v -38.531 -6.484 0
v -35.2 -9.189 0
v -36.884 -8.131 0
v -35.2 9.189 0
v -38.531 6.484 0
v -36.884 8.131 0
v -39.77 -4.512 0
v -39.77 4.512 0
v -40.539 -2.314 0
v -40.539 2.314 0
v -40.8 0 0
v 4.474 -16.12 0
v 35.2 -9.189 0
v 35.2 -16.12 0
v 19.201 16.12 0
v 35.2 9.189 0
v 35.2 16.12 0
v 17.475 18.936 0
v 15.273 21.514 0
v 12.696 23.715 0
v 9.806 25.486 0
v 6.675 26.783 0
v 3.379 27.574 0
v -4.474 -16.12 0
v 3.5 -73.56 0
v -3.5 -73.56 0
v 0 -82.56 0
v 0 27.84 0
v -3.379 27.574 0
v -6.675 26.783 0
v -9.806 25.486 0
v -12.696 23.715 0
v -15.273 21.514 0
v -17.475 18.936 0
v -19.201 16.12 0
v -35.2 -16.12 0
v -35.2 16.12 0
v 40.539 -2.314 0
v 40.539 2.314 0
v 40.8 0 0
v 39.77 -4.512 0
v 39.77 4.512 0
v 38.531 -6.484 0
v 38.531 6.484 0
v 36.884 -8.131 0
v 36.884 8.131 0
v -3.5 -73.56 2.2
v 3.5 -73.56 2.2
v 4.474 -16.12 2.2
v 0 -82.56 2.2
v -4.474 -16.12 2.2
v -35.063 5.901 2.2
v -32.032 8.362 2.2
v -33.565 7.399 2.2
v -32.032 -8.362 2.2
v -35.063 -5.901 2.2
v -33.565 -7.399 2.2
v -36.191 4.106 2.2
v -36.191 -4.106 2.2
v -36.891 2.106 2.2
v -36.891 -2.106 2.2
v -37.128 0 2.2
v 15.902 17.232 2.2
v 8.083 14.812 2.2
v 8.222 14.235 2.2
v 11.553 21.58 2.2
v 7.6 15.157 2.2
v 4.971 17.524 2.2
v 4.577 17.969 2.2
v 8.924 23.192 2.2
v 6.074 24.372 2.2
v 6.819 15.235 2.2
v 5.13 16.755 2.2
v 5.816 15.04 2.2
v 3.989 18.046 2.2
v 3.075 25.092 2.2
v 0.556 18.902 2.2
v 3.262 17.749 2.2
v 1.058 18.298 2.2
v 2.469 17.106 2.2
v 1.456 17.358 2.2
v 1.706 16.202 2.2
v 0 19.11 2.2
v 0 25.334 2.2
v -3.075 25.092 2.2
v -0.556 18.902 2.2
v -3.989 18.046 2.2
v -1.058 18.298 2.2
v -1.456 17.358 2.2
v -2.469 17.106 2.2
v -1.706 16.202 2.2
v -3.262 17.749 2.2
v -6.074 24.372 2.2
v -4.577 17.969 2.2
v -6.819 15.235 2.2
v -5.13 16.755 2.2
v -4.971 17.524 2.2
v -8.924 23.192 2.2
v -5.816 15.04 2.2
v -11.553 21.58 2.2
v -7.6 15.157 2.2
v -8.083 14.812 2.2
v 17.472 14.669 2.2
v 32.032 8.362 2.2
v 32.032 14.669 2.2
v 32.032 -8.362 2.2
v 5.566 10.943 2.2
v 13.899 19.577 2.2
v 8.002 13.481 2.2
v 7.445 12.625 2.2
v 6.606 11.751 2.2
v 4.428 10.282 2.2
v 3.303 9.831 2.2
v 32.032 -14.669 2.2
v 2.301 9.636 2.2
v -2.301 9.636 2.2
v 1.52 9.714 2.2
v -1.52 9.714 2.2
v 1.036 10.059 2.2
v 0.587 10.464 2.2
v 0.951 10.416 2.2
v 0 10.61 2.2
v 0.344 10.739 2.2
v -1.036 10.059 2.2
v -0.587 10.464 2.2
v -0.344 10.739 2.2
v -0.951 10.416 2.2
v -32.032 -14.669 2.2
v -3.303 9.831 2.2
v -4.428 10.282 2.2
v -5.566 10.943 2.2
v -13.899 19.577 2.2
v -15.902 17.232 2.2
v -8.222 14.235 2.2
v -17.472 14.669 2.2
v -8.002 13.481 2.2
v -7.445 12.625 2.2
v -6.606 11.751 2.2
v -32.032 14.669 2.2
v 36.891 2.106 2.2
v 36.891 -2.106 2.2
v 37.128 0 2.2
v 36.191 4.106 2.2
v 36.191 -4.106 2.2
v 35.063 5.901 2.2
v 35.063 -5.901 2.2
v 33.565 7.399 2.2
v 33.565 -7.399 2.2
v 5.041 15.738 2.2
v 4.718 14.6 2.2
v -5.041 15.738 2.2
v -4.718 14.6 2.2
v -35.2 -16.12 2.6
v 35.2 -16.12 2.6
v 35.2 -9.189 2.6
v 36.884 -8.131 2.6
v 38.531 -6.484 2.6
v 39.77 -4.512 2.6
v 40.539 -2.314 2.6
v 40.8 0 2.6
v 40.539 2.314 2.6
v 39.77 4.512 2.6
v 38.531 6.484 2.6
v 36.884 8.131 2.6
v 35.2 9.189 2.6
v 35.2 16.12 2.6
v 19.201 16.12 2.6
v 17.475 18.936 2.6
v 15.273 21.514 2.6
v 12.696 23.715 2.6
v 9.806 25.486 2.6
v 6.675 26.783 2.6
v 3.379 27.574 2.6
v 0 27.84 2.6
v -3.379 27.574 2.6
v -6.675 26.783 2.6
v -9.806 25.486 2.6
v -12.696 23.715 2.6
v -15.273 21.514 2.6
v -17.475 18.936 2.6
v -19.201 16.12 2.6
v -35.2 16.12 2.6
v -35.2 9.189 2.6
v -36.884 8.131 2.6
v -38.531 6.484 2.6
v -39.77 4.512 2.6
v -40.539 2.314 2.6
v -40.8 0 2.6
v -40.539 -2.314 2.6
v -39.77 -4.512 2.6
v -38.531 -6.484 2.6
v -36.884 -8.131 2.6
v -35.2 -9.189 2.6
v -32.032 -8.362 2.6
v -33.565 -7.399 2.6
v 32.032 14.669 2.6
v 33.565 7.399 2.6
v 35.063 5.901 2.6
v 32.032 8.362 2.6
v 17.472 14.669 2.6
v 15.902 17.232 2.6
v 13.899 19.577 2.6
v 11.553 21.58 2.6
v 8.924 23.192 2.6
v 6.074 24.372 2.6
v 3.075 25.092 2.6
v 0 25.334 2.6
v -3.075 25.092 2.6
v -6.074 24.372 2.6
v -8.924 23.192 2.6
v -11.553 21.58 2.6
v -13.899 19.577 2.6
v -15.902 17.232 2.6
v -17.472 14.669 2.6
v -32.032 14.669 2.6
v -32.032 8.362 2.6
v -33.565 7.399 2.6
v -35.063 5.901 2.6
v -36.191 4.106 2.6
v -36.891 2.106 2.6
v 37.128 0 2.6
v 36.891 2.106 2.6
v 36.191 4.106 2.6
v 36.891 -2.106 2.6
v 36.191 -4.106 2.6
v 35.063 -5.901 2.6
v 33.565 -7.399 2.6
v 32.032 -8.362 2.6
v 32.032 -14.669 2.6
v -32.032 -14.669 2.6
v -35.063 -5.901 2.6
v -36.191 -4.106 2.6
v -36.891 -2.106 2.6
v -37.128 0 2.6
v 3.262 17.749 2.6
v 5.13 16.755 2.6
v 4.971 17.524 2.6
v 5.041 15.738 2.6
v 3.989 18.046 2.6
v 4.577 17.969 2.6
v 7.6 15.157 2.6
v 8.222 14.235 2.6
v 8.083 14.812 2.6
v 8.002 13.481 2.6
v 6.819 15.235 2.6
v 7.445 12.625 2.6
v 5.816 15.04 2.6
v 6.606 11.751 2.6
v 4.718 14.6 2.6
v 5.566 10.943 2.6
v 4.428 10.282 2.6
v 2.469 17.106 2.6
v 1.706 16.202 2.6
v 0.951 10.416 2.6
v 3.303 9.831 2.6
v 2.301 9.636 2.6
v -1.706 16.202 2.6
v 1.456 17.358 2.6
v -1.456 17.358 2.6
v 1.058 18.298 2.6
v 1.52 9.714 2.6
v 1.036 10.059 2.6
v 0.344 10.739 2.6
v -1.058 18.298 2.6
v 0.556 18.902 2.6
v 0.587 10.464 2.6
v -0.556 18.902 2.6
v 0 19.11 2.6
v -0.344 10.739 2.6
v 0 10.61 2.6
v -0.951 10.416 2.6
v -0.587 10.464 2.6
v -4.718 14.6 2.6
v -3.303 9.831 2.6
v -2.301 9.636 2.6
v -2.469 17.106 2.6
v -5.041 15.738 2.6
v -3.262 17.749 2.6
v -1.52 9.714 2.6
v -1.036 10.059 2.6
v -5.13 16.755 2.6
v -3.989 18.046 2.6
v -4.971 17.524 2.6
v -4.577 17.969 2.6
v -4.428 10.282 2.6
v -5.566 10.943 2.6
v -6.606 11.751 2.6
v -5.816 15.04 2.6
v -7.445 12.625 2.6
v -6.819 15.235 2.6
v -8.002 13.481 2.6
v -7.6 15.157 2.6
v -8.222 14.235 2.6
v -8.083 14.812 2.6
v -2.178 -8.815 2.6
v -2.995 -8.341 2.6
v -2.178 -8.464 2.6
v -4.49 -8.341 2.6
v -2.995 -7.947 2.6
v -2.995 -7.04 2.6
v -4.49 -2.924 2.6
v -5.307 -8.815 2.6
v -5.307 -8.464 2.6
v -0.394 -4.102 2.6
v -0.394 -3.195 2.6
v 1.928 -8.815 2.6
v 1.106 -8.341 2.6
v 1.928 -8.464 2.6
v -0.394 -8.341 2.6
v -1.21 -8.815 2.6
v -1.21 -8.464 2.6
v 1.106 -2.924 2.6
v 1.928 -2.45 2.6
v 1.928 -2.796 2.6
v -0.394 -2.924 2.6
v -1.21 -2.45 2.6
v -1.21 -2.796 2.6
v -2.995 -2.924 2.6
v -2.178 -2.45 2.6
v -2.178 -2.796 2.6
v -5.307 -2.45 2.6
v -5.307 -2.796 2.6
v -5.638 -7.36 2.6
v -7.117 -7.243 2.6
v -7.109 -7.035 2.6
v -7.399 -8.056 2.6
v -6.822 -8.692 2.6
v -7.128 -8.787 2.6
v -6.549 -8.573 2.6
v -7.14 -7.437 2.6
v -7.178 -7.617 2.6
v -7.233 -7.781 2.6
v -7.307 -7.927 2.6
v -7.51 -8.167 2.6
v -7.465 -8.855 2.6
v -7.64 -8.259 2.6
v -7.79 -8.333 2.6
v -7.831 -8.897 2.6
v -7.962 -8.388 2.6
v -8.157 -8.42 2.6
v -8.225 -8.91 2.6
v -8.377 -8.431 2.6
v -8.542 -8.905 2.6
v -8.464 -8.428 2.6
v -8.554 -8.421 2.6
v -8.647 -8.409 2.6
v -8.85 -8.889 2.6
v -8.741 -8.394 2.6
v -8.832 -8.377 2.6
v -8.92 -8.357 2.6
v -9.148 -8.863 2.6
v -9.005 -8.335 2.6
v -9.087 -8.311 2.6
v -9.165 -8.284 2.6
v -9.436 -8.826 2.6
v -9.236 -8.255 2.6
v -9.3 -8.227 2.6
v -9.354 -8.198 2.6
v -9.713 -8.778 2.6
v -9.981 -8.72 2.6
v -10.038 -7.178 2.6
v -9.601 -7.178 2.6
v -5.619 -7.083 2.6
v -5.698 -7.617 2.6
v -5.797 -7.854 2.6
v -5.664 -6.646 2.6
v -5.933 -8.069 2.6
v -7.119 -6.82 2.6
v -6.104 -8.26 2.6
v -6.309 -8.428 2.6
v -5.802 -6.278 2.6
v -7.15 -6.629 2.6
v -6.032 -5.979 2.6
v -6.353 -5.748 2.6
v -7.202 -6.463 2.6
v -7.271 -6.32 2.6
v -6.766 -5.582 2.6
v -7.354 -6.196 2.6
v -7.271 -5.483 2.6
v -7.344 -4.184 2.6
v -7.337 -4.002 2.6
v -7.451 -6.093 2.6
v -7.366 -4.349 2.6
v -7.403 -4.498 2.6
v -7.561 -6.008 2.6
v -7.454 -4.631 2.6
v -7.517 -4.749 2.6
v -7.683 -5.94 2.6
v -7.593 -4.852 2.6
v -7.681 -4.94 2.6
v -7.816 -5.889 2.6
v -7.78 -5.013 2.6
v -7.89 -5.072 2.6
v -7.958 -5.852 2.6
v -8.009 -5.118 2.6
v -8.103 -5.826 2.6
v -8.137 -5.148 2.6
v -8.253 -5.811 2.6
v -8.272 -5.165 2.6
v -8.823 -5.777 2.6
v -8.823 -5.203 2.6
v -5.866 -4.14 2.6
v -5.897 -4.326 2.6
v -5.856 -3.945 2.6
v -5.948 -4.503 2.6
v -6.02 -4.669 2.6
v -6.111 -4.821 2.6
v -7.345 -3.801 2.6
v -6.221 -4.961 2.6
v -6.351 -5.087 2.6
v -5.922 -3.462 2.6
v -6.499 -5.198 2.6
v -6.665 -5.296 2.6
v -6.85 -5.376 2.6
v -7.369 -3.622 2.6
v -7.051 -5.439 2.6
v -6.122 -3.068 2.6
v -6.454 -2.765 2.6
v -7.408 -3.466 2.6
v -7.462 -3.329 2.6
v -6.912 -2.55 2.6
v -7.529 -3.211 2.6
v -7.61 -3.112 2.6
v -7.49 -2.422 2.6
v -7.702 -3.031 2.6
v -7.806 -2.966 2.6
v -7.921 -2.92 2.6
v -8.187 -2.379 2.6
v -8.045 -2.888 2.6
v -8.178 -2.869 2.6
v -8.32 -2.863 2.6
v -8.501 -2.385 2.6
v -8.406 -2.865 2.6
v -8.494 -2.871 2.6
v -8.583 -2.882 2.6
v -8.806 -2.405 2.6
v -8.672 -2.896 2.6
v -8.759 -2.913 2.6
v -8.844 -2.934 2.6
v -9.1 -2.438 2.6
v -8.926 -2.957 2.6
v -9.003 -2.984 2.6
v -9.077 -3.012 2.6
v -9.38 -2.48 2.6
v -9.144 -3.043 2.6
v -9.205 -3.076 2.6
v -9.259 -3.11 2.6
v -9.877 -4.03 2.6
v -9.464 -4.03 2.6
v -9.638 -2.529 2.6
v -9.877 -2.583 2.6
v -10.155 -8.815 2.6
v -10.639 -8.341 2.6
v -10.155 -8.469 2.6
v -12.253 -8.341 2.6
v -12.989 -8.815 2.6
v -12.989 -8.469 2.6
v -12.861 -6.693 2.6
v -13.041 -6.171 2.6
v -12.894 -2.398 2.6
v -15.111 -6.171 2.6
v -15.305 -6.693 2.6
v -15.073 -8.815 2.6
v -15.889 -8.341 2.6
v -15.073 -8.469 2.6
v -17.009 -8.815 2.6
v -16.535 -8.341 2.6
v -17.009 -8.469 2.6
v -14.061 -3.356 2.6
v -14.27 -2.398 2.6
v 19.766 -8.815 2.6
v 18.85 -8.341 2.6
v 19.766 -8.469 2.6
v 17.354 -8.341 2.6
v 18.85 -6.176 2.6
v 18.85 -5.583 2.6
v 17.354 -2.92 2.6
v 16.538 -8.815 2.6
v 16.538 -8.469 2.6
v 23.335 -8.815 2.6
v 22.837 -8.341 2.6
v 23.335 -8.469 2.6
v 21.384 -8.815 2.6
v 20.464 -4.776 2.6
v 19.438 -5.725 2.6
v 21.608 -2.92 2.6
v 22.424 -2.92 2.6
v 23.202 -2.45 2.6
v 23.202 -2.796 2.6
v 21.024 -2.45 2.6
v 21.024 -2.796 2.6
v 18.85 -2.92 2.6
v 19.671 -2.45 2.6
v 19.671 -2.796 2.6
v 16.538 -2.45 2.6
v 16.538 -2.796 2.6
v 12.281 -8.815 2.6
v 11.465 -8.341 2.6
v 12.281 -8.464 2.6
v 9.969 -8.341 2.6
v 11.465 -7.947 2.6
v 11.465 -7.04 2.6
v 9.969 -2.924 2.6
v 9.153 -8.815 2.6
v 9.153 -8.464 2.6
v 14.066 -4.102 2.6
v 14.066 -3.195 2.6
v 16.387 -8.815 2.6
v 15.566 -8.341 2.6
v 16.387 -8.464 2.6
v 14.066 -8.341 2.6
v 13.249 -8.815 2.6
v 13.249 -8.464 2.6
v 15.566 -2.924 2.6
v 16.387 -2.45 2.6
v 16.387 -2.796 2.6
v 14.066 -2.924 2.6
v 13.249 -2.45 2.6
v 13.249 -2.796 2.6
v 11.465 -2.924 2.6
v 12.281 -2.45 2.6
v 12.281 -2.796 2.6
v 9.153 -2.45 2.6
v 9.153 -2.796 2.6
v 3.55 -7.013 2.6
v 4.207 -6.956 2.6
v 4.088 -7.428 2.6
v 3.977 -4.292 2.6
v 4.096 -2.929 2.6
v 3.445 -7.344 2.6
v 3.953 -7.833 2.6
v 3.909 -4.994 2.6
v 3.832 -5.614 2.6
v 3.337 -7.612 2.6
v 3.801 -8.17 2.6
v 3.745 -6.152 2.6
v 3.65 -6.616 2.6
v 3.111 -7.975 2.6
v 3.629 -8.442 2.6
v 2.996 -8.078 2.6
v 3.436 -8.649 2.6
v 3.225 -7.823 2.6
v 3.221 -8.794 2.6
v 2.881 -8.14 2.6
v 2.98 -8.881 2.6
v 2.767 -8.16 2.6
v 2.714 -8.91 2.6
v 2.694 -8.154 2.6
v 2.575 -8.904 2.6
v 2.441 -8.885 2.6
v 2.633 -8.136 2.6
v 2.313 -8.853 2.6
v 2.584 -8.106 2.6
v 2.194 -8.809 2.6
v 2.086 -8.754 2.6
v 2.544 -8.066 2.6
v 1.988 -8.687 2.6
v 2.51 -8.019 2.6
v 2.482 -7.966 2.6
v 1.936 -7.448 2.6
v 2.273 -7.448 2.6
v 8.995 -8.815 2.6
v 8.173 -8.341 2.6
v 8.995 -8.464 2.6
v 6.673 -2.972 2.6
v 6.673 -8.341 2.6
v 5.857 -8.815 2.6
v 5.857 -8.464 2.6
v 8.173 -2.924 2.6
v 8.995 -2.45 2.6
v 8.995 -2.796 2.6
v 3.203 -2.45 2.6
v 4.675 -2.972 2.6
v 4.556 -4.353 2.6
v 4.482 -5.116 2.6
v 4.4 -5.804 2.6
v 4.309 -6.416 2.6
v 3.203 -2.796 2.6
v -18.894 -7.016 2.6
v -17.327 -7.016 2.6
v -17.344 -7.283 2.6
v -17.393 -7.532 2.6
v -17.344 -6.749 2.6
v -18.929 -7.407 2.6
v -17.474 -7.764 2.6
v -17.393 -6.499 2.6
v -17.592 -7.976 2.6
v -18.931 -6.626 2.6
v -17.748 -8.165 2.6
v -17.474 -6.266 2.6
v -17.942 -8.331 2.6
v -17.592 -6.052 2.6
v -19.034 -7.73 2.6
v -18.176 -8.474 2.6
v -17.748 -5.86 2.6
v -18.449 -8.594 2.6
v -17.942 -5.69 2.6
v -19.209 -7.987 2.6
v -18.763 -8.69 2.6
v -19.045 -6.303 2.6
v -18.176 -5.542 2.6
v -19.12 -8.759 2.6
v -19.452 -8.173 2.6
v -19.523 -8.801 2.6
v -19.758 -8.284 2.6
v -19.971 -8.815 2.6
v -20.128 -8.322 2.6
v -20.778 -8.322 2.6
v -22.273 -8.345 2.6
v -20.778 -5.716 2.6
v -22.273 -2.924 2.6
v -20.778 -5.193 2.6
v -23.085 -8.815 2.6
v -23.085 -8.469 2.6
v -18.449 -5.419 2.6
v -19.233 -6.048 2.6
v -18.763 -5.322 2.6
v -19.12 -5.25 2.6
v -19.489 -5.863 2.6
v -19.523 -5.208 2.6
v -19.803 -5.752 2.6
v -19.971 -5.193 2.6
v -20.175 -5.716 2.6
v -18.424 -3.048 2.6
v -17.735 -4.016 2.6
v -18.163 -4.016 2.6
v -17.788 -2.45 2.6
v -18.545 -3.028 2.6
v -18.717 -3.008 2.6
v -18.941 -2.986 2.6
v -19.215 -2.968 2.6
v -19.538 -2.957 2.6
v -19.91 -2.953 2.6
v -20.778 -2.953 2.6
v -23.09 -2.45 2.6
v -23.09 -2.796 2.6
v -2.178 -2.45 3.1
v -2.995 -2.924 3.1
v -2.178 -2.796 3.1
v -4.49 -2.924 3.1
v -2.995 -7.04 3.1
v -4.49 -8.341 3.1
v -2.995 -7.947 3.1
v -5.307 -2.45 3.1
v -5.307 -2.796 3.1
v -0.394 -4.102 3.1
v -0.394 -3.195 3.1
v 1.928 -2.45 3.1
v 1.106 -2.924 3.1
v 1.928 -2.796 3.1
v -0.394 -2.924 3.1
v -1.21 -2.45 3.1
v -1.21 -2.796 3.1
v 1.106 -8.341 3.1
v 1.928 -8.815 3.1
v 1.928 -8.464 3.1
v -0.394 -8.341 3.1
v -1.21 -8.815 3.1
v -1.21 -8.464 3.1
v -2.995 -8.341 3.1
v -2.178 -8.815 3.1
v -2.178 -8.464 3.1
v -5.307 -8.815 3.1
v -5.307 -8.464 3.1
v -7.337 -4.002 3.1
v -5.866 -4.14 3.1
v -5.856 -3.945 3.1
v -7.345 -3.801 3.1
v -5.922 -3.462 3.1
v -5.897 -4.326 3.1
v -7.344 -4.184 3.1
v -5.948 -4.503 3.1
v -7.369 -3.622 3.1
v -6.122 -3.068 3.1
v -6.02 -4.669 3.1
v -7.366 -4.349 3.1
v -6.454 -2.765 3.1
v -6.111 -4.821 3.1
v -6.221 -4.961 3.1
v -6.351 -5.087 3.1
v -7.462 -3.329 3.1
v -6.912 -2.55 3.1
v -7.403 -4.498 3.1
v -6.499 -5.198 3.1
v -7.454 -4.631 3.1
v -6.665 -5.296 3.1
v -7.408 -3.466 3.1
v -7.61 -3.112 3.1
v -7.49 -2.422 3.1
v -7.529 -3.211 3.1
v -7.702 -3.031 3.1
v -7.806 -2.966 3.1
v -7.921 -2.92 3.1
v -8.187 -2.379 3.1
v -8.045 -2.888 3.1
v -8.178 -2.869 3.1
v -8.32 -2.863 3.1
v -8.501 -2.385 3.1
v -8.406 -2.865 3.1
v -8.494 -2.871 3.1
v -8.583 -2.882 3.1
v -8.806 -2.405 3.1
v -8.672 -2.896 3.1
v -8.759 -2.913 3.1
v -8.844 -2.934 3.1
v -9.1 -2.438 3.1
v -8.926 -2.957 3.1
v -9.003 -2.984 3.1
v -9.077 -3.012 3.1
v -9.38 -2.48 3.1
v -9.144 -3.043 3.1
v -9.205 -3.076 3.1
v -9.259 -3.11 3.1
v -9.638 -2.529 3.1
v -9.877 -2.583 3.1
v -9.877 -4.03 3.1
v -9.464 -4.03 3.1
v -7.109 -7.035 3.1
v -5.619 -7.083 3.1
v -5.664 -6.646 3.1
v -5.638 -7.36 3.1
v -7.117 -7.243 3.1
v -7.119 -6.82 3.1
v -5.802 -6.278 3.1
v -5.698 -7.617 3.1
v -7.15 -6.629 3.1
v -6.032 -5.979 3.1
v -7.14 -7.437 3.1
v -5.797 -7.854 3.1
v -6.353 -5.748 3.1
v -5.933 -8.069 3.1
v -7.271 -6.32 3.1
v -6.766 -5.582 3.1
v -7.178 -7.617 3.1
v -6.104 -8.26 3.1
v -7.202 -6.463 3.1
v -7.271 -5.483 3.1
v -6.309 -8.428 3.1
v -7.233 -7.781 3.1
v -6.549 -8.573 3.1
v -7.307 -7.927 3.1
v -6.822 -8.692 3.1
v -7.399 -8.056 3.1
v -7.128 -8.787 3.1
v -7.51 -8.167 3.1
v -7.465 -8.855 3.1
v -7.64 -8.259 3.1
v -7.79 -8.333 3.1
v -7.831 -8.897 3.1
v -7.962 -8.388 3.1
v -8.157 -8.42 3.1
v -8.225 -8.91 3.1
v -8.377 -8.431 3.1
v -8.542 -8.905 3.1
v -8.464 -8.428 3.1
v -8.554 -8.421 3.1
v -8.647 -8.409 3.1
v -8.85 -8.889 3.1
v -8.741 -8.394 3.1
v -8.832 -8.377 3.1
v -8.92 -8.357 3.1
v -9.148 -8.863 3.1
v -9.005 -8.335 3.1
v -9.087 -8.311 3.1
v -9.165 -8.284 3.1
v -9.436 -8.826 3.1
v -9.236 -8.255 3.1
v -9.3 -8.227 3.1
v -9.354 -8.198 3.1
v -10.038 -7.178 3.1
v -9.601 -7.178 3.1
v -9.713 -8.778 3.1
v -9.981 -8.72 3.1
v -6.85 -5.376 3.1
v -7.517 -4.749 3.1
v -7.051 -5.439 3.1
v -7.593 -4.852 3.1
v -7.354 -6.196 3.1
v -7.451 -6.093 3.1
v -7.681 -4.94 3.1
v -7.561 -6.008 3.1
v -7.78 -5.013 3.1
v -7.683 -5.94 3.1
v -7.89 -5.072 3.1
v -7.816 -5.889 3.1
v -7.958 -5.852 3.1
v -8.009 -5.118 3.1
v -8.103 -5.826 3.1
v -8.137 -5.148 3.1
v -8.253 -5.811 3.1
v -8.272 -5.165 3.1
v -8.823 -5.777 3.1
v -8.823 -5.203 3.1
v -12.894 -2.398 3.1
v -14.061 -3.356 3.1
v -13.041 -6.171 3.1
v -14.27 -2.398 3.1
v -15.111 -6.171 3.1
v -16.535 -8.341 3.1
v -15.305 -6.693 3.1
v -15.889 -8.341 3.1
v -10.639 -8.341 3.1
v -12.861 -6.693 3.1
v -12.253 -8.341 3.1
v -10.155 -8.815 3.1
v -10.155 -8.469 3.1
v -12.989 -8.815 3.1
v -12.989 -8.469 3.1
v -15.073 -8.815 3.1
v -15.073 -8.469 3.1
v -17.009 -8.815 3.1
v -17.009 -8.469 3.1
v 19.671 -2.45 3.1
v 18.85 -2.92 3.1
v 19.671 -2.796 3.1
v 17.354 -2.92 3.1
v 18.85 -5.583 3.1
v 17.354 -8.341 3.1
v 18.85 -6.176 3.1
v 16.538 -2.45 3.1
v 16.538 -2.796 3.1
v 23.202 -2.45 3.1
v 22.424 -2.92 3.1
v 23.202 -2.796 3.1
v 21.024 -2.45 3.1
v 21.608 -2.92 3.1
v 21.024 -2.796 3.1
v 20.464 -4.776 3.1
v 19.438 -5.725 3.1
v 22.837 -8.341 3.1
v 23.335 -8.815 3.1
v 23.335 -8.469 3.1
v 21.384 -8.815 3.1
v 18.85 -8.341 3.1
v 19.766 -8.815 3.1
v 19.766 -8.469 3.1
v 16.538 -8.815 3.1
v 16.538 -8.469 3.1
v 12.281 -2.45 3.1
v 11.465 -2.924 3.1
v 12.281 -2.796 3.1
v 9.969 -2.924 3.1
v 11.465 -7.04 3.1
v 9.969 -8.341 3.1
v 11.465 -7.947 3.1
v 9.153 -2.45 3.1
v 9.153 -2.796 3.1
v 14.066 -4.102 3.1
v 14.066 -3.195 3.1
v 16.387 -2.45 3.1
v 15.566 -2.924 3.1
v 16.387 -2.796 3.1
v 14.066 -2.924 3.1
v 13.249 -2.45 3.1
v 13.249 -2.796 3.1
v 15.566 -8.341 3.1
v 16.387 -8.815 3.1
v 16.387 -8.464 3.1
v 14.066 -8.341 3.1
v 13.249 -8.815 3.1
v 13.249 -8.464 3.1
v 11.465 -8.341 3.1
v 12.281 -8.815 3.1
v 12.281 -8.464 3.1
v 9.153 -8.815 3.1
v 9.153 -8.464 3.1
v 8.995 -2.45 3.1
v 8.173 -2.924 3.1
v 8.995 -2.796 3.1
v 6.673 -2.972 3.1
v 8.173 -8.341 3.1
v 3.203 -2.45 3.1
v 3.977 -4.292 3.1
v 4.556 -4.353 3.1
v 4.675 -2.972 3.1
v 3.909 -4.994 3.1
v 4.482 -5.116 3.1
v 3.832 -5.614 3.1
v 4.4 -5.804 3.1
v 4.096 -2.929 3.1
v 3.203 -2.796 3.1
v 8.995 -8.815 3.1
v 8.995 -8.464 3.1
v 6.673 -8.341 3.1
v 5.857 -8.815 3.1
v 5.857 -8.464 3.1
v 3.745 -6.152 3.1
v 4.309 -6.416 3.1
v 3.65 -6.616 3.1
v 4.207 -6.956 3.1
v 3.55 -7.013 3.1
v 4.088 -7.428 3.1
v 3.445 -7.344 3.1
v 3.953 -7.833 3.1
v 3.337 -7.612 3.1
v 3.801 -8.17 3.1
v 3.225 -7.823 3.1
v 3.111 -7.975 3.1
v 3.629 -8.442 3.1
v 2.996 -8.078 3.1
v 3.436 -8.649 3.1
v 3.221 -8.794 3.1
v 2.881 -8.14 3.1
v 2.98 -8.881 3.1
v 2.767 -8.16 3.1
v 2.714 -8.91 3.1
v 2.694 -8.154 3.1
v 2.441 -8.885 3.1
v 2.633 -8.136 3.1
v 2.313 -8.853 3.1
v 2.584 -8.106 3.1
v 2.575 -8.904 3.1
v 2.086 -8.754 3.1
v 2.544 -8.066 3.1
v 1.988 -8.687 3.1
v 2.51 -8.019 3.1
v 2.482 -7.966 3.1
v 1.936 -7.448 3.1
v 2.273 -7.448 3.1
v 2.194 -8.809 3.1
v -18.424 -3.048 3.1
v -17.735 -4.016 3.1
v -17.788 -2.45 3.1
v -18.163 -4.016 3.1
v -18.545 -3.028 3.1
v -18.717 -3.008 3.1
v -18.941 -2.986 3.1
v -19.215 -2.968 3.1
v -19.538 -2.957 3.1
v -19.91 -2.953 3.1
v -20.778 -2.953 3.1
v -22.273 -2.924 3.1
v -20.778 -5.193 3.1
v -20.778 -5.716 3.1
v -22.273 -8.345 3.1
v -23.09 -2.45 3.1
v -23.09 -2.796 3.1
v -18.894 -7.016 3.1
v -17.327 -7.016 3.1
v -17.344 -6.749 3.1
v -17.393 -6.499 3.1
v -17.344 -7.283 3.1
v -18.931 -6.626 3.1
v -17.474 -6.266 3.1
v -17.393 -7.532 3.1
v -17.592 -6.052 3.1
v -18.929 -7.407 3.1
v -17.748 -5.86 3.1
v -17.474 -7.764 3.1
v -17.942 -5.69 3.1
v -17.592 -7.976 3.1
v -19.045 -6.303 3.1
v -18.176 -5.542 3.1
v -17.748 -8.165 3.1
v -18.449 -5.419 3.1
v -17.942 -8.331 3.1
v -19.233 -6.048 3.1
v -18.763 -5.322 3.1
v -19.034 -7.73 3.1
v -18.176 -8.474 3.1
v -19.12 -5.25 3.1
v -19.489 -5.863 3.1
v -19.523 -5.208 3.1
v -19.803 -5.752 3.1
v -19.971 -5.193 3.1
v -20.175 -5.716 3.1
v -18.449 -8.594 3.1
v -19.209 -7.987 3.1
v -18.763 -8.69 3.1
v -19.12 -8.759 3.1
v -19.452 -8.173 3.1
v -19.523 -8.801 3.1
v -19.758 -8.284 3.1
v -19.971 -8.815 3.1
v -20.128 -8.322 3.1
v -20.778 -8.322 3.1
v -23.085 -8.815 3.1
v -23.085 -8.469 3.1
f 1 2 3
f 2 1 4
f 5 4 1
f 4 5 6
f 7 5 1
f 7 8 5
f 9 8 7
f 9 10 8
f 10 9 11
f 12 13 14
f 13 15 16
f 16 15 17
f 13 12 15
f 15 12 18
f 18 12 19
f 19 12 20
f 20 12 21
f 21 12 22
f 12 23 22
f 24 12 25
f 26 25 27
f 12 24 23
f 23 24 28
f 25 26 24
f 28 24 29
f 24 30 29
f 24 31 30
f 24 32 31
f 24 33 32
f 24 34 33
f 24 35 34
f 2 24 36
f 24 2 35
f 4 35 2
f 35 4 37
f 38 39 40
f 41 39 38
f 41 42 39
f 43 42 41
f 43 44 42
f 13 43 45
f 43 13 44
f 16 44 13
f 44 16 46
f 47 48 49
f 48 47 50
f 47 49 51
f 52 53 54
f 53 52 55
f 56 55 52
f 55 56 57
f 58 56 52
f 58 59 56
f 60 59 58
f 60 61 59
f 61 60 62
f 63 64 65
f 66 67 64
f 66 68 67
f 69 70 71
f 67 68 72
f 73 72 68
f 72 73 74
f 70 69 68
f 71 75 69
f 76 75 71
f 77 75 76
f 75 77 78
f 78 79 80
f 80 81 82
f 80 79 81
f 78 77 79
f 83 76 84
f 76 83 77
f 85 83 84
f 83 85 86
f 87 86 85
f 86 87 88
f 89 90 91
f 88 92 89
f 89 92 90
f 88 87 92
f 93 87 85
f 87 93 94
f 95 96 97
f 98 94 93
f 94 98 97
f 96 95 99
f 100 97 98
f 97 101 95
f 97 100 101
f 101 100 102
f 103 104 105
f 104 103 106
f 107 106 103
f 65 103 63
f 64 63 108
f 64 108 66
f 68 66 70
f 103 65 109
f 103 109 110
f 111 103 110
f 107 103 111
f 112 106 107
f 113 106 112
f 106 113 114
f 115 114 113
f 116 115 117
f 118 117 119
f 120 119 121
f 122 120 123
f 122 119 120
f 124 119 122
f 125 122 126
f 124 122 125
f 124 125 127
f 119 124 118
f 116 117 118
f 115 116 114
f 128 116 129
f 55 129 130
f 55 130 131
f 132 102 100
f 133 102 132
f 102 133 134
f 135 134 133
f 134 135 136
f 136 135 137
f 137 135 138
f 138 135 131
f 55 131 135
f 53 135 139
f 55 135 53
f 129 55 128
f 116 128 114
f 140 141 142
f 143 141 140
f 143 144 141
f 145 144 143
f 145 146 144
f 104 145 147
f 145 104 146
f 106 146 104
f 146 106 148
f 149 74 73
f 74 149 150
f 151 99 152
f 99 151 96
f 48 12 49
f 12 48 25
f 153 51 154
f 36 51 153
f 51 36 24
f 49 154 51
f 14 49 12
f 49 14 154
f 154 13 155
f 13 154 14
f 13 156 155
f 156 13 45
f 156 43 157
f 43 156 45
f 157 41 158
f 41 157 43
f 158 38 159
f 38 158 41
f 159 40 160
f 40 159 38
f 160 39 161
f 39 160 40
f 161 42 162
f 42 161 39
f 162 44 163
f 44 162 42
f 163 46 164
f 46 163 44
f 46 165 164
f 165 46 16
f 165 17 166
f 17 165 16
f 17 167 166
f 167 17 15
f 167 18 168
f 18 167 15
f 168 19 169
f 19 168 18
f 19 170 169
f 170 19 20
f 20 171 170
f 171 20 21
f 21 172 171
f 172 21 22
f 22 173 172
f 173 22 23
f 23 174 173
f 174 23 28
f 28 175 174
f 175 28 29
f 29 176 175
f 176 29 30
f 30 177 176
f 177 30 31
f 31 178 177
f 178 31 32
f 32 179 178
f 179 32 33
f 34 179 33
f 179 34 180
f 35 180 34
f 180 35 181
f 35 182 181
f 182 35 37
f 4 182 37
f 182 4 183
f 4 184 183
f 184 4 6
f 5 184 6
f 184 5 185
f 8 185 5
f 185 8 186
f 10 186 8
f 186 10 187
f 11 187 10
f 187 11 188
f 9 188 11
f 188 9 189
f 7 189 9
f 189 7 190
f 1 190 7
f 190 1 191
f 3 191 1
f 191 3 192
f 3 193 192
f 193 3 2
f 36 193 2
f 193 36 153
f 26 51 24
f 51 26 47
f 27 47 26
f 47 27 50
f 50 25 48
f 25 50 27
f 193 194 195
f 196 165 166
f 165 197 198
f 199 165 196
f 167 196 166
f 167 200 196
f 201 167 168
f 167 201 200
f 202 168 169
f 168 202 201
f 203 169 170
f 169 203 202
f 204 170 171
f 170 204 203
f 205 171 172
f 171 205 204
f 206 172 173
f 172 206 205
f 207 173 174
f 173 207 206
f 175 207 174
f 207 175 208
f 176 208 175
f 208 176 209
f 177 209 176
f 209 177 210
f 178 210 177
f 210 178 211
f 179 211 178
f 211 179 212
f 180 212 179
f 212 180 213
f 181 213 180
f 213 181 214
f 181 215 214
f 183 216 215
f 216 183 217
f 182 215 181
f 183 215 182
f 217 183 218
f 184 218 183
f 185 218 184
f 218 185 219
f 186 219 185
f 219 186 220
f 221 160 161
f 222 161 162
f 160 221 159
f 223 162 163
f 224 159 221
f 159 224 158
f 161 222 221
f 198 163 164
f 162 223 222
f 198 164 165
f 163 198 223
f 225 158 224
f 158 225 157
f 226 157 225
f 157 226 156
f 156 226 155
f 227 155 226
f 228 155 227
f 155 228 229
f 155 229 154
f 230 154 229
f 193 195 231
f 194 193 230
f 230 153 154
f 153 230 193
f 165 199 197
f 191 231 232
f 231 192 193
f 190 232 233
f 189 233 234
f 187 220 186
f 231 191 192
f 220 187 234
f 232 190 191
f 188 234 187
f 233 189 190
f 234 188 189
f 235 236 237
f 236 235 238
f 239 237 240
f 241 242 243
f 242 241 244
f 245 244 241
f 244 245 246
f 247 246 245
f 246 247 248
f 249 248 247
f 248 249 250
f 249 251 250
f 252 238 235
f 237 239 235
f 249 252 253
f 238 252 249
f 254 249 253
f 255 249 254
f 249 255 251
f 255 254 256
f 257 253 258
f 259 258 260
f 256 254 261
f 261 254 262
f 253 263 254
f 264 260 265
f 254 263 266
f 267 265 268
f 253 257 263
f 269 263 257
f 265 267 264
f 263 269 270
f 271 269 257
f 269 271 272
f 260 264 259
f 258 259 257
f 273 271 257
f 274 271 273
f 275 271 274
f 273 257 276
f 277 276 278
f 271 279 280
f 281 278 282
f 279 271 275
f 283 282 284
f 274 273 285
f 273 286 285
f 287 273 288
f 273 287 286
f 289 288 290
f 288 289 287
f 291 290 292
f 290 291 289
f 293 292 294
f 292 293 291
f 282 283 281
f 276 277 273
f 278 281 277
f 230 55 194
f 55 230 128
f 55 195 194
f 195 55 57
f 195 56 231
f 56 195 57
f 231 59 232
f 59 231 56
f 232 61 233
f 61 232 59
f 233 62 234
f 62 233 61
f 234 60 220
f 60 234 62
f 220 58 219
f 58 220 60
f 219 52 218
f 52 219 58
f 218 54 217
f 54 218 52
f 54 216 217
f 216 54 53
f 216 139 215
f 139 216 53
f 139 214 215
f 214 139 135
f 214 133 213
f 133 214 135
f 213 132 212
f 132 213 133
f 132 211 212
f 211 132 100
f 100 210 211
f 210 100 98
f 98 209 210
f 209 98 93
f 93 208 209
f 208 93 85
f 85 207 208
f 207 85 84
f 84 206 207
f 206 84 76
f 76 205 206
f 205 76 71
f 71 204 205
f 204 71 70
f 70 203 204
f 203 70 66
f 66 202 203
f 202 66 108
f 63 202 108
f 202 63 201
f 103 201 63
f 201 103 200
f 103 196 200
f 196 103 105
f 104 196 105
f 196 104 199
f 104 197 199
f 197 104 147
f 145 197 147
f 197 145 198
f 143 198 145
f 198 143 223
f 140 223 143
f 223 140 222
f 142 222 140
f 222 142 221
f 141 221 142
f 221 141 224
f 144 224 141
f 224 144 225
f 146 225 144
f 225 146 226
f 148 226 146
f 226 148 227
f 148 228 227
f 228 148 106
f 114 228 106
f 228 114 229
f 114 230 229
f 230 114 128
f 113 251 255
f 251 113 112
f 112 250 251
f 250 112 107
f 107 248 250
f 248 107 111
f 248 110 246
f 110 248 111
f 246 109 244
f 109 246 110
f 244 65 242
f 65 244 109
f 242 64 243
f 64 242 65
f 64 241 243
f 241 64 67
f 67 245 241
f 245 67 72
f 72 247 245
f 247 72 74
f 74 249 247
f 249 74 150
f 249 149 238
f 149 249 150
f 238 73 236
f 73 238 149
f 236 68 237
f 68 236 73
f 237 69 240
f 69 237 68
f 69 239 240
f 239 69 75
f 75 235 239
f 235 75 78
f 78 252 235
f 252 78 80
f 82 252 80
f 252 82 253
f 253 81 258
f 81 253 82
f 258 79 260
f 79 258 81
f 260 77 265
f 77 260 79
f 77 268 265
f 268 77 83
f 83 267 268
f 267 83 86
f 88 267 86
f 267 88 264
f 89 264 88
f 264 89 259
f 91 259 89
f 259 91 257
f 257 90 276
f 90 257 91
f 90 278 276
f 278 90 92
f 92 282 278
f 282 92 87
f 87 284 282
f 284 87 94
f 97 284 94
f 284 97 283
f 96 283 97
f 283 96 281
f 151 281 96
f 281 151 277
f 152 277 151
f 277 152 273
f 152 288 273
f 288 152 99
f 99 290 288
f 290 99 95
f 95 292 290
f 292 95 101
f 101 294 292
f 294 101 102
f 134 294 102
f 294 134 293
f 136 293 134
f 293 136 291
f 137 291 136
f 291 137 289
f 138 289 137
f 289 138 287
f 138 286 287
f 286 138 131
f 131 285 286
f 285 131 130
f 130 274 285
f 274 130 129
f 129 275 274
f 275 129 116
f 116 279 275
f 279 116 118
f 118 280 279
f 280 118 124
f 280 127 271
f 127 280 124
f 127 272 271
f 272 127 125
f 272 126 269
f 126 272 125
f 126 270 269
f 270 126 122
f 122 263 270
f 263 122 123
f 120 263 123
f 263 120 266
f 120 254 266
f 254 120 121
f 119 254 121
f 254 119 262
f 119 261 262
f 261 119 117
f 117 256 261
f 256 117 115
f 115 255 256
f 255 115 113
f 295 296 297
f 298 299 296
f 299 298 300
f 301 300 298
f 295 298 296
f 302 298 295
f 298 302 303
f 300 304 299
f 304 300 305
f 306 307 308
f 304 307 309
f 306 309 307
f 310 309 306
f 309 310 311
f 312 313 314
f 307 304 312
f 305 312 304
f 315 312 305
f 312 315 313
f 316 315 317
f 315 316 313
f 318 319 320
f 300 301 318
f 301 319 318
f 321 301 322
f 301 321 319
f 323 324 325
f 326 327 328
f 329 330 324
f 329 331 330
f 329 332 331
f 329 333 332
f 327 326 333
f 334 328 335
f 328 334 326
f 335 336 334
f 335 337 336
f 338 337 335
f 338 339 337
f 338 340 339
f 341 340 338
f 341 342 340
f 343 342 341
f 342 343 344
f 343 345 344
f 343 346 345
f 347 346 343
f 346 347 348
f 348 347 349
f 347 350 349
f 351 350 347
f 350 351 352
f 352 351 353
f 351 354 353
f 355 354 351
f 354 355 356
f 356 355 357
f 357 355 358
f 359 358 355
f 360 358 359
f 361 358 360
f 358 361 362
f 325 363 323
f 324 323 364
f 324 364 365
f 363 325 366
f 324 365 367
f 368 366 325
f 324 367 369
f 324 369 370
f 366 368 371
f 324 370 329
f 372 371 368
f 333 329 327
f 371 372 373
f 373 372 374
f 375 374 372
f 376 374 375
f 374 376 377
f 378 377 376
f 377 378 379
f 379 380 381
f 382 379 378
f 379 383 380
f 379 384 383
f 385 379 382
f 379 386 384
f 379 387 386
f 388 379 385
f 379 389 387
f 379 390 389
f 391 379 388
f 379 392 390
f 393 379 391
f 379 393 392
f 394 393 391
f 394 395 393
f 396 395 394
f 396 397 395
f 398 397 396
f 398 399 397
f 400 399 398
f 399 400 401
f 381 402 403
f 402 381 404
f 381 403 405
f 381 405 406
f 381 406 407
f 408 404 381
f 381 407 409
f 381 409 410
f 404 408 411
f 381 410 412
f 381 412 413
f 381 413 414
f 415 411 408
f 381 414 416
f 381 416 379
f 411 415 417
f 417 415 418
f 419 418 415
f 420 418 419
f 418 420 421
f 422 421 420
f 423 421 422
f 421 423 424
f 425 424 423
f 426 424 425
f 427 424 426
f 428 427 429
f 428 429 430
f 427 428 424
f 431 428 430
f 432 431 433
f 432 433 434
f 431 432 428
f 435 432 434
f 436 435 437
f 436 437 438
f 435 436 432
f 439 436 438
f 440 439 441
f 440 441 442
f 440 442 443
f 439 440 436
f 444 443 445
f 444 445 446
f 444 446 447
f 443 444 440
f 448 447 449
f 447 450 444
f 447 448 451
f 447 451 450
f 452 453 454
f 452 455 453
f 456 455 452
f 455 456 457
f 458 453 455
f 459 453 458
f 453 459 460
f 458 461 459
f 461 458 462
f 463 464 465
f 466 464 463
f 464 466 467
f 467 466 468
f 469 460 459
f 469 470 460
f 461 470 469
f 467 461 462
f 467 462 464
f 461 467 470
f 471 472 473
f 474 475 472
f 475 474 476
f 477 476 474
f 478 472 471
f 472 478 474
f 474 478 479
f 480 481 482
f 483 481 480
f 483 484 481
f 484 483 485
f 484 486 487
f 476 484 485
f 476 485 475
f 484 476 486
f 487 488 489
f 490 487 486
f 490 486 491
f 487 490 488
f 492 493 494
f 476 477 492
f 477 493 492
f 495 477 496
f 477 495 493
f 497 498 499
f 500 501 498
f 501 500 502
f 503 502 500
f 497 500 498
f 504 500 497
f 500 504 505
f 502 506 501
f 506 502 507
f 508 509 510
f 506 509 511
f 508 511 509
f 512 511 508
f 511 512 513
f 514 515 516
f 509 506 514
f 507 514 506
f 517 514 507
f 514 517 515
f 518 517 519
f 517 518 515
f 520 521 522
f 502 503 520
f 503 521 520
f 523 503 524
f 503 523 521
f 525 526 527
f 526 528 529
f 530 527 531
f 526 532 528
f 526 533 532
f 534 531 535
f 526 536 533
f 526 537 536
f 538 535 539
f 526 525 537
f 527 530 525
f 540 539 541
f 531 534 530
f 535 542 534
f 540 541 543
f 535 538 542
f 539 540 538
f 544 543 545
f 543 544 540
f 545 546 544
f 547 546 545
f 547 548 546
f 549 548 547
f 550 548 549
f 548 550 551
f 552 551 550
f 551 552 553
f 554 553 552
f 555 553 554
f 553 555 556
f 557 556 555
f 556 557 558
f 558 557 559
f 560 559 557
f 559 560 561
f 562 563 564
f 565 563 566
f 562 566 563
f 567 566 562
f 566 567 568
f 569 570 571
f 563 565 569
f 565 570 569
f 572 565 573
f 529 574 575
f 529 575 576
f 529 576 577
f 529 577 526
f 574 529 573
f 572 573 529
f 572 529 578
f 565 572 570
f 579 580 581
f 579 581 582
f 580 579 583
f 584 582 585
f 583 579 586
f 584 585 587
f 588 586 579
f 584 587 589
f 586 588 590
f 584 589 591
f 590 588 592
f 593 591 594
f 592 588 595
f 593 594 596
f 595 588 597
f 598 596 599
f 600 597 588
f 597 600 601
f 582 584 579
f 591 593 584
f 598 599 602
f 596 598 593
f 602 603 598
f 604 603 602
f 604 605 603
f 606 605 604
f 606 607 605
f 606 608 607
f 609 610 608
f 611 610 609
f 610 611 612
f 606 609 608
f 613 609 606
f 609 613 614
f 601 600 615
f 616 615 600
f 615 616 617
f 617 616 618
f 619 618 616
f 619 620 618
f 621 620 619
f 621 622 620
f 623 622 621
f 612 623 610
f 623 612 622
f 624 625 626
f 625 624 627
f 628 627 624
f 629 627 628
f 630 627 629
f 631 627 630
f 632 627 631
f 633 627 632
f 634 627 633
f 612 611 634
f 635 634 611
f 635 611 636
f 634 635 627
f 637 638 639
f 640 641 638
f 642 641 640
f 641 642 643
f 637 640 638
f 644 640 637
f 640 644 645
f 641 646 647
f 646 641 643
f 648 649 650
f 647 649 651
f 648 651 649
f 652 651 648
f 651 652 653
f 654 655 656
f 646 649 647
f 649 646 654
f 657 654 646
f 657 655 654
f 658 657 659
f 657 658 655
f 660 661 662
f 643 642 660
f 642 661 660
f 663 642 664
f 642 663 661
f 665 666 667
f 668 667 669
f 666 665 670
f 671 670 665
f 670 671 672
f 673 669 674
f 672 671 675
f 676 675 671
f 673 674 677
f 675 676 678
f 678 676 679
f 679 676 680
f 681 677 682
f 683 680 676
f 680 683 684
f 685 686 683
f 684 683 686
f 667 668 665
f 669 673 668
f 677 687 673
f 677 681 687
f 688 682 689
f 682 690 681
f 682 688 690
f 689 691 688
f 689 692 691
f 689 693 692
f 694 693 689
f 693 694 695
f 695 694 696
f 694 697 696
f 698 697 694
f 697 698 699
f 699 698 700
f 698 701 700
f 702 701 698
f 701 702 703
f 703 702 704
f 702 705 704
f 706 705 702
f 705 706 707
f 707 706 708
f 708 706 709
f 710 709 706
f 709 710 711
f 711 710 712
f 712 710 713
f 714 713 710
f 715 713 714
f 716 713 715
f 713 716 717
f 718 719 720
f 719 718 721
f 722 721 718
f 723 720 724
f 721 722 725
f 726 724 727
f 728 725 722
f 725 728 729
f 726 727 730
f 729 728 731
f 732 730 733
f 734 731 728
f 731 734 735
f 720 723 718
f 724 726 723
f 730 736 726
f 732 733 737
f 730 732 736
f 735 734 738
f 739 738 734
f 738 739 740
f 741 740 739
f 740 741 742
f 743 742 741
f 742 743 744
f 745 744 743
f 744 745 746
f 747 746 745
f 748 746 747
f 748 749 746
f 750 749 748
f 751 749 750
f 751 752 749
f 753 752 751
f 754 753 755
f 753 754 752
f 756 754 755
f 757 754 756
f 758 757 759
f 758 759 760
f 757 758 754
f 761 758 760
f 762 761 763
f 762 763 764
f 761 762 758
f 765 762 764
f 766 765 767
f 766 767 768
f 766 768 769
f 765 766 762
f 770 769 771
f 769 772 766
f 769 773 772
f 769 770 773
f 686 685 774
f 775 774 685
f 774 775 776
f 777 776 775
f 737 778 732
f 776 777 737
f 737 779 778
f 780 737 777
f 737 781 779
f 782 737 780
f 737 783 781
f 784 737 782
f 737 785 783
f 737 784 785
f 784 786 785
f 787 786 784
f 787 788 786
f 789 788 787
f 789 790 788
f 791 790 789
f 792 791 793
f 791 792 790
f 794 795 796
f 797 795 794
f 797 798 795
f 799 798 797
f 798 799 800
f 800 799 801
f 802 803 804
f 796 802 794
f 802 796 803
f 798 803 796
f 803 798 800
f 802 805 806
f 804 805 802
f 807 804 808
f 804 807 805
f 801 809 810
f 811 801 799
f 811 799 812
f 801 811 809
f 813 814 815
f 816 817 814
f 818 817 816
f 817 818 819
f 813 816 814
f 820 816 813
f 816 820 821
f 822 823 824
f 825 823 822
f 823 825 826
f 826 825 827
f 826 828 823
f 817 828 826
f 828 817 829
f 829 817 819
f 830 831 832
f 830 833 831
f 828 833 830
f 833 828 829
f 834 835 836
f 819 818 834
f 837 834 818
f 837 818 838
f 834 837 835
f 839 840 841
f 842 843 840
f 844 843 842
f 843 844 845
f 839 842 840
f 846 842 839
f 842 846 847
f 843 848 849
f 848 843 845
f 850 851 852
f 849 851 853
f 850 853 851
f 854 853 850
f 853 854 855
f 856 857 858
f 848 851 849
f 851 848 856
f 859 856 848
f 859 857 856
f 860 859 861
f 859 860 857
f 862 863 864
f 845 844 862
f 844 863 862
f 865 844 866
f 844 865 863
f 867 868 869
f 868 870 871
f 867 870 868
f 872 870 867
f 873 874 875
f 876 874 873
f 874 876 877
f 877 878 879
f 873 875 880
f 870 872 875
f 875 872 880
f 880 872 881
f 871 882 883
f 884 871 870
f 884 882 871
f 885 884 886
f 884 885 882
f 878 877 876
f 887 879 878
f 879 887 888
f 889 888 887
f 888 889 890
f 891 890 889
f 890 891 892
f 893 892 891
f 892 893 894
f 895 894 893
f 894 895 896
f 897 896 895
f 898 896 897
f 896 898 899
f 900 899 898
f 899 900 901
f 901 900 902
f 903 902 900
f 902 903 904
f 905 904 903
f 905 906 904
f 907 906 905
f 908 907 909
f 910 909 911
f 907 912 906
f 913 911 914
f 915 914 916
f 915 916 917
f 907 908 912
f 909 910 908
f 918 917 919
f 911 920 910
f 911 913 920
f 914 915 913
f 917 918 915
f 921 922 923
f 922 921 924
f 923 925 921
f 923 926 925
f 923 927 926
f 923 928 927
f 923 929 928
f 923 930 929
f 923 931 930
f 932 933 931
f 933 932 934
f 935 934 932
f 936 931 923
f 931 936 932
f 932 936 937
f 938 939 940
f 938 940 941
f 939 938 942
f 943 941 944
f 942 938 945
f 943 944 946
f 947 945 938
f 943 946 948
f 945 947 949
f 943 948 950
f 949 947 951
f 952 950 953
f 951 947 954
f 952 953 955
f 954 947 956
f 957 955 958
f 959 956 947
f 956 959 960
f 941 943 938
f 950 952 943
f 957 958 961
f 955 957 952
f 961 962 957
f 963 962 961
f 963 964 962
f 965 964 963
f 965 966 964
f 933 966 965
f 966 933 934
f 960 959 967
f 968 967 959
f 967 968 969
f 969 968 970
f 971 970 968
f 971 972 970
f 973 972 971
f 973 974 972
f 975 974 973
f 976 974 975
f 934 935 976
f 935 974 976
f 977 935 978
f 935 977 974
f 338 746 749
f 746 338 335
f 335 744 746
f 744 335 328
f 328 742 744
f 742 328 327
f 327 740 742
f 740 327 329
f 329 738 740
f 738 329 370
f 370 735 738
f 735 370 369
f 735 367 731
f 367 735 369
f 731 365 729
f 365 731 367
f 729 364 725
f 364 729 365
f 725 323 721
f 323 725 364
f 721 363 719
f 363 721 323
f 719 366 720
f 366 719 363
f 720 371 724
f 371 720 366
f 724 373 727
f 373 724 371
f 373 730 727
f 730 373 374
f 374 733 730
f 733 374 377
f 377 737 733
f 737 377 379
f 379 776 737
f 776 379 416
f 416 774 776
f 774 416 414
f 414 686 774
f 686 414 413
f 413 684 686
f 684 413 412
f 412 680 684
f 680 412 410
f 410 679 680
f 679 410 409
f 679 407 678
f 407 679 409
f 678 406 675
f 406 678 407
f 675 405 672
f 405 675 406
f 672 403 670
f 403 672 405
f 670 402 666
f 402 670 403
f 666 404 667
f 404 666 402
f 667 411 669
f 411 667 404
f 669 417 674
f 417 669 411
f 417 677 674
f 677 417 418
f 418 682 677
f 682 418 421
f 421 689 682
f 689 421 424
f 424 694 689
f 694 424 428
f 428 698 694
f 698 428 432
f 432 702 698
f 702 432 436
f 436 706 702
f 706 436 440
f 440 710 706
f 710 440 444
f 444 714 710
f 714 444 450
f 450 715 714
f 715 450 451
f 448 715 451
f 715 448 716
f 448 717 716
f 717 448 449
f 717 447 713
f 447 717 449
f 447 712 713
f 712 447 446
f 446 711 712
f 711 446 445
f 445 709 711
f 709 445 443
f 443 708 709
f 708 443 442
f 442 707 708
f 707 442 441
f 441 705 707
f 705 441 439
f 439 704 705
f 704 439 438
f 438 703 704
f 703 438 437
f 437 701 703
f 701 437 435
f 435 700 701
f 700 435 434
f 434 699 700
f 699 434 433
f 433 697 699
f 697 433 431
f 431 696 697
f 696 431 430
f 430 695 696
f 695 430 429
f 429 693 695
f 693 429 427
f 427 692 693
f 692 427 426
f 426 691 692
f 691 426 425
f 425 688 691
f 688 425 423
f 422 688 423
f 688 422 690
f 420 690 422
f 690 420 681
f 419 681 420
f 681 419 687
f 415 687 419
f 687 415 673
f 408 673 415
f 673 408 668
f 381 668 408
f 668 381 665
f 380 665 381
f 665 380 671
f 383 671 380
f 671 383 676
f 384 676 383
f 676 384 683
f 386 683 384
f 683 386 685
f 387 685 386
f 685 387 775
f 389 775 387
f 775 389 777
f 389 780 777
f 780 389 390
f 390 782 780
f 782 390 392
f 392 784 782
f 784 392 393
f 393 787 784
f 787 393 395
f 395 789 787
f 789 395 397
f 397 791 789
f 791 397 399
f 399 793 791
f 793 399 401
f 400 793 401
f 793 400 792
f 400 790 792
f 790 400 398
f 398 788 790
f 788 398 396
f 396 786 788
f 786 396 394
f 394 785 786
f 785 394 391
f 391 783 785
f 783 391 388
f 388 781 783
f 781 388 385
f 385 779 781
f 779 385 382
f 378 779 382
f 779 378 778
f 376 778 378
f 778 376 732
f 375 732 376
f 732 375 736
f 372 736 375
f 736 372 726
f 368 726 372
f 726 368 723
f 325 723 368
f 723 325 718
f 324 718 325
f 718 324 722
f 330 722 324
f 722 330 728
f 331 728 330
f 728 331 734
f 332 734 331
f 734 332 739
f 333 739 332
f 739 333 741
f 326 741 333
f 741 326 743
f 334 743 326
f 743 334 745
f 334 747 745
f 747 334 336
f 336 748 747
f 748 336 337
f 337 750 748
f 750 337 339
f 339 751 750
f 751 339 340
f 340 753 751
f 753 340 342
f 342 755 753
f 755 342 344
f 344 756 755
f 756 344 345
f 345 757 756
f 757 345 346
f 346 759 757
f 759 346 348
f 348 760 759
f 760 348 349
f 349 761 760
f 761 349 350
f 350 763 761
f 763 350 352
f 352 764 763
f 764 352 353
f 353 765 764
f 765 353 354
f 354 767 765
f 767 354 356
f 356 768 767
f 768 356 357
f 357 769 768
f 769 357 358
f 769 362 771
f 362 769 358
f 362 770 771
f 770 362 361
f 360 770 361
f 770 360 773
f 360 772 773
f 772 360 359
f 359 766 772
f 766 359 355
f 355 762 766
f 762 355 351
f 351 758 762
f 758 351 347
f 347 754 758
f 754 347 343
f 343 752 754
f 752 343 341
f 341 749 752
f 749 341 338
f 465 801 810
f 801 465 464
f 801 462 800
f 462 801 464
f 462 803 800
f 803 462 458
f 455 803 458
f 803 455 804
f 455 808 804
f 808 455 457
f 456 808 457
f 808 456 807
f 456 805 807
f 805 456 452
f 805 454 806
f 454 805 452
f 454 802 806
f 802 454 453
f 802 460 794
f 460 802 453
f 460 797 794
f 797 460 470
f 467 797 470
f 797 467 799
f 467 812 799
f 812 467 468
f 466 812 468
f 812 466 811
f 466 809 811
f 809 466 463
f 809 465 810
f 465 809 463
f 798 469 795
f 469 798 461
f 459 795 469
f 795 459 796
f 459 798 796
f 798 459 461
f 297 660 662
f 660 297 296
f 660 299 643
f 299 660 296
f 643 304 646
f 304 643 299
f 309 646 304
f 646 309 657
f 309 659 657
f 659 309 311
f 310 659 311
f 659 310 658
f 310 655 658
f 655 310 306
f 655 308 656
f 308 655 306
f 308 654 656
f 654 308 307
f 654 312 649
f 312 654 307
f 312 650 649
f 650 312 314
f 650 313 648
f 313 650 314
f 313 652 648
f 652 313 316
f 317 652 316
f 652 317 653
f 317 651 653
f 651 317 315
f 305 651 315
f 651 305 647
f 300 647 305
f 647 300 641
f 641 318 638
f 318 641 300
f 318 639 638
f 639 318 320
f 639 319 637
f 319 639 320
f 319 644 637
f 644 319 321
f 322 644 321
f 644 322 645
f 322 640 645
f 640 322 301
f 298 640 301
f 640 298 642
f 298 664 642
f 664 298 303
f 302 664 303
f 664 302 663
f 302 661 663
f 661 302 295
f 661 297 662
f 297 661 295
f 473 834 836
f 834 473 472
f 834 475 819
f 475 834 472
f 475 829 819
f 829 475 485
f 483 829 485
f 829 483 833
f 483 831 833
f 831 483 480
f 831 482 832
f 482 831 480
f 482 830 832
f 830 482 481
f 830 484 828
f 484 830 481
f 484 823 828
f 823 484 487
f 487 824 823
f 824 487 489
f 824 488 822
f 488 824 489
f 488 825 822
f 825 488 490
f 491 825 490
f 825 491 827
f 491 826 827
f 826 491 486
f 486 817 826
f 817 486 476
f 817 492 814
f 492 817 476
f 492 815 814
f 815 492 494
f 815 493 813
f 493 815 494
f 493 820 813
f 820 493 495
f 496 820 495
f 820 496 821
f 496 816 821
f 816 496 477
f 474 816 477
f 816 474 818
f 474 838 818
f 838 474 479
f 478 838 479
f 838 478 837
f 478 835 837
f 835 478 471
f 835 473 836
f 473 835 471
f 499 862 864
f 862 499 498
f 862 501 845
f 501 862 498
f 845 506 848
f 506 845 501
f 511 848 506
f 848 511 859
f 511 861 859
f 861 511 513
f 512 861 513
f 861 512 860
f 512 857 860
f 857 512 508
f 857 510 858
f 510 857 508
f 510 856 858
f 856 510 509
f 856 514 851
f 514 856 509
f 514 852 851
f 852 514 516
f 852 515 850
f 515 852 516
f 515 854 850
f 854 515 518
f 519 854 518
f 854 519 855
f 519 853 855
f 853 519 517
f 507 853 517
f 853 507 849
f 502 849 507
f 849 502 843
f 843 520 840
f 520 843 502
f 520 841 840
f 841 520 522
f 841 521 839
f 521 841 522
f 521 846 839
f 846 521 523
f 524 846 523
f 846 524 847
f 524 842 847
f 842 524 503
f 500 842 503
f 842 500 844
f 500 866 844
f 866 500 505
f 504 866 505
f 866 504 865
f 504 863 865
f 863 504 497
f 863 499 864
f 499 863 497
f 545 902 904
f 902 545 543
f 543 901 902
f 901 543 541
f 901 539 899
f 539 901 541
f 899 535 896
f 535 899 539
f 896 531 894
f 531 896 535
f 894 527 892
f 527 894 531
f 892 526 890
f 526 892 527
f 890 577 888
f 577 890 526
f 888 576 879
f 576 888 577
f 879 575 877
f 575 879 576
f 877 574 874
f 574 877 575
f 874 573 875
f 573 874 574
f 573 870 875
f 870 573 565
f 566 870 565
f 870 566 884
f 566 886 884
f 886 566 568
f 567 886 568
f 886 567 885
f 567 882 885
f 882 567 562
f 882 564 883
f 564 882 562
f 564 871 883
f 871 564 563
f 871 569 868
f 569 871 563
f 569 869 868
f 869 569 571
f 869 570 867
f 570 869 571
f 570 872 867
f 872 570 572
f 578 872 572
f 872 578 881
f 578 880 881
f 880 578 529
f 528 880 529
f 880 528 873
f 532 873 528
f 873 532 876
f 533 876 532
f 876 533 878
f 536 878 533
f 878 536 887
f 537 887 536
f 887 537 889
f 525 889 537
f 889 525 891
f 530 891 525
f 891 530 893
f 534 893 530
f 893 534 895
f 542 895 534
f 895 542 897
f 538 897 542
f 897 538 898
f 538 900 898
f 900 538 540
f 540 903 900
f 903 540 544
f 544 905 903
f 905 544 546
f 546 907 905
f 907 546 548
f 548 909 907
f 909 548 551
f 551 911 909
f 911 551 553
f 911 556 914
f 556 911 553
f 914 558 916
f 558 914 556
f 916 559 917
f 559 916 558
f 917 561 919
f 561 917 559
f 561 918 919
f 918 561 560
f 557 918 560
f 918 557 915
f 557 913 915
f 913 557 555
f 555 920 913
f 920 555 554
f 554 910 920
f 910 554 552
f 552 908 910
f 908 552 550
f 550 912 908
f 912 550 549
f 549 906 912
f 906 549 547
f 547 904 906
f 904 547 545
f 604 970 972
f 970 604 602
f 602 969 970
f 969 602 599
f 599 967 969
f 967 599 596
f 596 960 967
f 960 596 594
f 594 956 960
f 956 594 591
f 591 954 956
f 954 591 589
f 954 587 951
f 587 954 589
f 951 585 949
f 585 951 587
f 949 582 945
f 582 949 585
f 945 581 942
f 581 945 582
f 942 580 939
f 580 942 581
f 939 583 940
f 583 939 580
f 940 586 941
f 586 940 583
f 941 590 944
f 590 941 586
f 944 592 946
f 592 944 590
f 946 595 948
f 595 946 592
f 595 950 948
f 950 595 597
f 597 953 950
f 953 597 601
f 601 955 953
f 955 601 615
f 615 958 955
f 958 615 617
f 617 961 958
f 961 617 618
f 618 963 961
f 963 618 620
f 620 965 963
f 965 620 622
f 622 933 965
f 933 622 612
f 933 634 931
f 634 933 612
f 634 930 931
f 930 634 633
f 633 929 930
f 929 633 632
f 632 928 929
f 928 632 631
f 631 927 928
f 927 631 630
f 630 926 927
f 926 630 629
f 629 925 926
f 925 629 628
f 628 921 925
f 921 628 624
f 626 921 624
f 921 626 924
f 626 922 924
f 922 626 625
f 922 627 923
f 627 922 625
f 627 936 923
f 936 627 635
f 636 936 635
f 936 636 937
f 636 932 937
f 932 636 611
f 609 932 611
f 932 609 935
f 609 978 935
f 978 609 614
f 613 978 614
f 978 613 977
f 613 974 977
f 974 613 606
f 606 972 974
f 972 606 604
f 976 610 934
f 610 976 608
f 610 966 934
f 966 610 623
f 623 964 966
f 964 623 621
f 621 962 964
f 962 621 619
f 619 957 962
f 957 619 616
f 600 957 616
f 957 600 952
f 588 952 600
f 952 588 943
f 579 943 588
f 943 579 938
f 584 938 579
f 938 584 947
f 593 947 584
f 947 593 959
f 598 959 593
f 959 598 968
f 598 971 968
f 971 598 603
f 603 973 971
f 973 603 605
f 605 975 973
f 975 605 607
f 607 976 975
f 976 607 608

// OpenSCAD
// Provence collection ("Прованс"):
// z = 0..2.2 mm: French-country plaque + stake (base filament)
// z = 2.2..2.6 mm: stepped border + embossed botanical sprig (accent filament)
// z = 2.6..3.1 mm: uppercase serif inscription (text filament)
tag_length = 80;
tag_height = 52;
tag_shape = "plaque";
tag_motif = "basil";
tag_text_1 = "БАЗИЛИК";
tag_text_2 = "";
font_size = 7.0;
letter_relief = 0.5;
font_name = "Liberation Serif:style=Bold";
stake_length = 68;

module plaque_2d(sc = 1) {
  scale([sc, sc])
    if (tag_shape == "watering_can" || tag_motif == "marjoram") {
      union() {
        polygon([
          [-22, -20], [22, -20], [18, 18], [-18, 18]
        ]);
        polygon([
          [-18, -4], [-38, 10], [-35, 15], [-16, 4]
        ]);
        difference() {
          translate([24, 0]) circle(r=11, $fn=28);
          translate([24, 0]) circle(r=6.5, $fn=28);
        }
      }
    } else if (tag_motif == "mint") {
      hull() {
        translate([-tag_length * 0.2, tag_height * 0.16]) circle(r=16, $fn=36);
        translate([tag_length * 0.2, tag_height * 0.16]) circle(r=16, $fn=36);
        translate([0, -tag_height * 0.42]) circle(r=4, $fn=20);
      }
    } else if (tag_motif == "rosemary") {
      resize([tag_length, tag_height * 0.78]) circle(d=tag_length, $fn=48);
    } else {
      union() {
        square([tag_length * 0.88, tag_height * 0.62], center=true);
        translate([0, tag_height * 0.12]) circle(r=tag_length * 0.27, $fn=40);
        translate([-tag_length * 0.38, 0]) circle(r=tag_height * 0.2, $fn=28);
        translate([tag_length * 0.38, 0]) circle(r=tag_height * 0.2, $fn=28);
      }
    }
}

module stake_2d() {
  polygon([
    [-4.5, -tag_height * 0.28],
    [4.5, -tag_height * 0.28],
    [3.5, -tag_height * 0.28 - stake_length + 9],
    [0, -tag_height * 0.28 - stake_length],
    [-3.5, -tag_height * 0.28 - stake_length + 9]
  ]);
}

module sprig_2d() {
  translate([0, tag_height * 0.18])
    for (a = [-56, -28, 0, 28, 56])
      rotate([0, 0, a])
        translate([0, 5.5])
          resize([3.6, 8.5]) circle(d=6, $fn=20);
}

linear_extrude(height=2.2) {
  plaque_2d(1);
  stake_2d();
}

translate([0, 0, 2.2])
  linear_extrude(height=0.4) {
    difference() {
      plaque_2d(1);
      plaque_2d(0.91);
    }
    sprig_2d();
  }

translate([0, 0, 2.6])
  linear_extrude(height=letter_relief) {
    translate([0, -tag_height * 0.11 + (tag_text_2 == "" ? 0 : font_size * 0.52)])
      text(tag_text_1, size=font_size, font=font_name, halign="center", valign="center");
    if (tag_text_2 != "")
      translate([0, -tag_height * 0.11 - font_size * 0.62])
        text(tag_text_2, size=font_size, font=font_name, halign="center", valign="center");
  }
